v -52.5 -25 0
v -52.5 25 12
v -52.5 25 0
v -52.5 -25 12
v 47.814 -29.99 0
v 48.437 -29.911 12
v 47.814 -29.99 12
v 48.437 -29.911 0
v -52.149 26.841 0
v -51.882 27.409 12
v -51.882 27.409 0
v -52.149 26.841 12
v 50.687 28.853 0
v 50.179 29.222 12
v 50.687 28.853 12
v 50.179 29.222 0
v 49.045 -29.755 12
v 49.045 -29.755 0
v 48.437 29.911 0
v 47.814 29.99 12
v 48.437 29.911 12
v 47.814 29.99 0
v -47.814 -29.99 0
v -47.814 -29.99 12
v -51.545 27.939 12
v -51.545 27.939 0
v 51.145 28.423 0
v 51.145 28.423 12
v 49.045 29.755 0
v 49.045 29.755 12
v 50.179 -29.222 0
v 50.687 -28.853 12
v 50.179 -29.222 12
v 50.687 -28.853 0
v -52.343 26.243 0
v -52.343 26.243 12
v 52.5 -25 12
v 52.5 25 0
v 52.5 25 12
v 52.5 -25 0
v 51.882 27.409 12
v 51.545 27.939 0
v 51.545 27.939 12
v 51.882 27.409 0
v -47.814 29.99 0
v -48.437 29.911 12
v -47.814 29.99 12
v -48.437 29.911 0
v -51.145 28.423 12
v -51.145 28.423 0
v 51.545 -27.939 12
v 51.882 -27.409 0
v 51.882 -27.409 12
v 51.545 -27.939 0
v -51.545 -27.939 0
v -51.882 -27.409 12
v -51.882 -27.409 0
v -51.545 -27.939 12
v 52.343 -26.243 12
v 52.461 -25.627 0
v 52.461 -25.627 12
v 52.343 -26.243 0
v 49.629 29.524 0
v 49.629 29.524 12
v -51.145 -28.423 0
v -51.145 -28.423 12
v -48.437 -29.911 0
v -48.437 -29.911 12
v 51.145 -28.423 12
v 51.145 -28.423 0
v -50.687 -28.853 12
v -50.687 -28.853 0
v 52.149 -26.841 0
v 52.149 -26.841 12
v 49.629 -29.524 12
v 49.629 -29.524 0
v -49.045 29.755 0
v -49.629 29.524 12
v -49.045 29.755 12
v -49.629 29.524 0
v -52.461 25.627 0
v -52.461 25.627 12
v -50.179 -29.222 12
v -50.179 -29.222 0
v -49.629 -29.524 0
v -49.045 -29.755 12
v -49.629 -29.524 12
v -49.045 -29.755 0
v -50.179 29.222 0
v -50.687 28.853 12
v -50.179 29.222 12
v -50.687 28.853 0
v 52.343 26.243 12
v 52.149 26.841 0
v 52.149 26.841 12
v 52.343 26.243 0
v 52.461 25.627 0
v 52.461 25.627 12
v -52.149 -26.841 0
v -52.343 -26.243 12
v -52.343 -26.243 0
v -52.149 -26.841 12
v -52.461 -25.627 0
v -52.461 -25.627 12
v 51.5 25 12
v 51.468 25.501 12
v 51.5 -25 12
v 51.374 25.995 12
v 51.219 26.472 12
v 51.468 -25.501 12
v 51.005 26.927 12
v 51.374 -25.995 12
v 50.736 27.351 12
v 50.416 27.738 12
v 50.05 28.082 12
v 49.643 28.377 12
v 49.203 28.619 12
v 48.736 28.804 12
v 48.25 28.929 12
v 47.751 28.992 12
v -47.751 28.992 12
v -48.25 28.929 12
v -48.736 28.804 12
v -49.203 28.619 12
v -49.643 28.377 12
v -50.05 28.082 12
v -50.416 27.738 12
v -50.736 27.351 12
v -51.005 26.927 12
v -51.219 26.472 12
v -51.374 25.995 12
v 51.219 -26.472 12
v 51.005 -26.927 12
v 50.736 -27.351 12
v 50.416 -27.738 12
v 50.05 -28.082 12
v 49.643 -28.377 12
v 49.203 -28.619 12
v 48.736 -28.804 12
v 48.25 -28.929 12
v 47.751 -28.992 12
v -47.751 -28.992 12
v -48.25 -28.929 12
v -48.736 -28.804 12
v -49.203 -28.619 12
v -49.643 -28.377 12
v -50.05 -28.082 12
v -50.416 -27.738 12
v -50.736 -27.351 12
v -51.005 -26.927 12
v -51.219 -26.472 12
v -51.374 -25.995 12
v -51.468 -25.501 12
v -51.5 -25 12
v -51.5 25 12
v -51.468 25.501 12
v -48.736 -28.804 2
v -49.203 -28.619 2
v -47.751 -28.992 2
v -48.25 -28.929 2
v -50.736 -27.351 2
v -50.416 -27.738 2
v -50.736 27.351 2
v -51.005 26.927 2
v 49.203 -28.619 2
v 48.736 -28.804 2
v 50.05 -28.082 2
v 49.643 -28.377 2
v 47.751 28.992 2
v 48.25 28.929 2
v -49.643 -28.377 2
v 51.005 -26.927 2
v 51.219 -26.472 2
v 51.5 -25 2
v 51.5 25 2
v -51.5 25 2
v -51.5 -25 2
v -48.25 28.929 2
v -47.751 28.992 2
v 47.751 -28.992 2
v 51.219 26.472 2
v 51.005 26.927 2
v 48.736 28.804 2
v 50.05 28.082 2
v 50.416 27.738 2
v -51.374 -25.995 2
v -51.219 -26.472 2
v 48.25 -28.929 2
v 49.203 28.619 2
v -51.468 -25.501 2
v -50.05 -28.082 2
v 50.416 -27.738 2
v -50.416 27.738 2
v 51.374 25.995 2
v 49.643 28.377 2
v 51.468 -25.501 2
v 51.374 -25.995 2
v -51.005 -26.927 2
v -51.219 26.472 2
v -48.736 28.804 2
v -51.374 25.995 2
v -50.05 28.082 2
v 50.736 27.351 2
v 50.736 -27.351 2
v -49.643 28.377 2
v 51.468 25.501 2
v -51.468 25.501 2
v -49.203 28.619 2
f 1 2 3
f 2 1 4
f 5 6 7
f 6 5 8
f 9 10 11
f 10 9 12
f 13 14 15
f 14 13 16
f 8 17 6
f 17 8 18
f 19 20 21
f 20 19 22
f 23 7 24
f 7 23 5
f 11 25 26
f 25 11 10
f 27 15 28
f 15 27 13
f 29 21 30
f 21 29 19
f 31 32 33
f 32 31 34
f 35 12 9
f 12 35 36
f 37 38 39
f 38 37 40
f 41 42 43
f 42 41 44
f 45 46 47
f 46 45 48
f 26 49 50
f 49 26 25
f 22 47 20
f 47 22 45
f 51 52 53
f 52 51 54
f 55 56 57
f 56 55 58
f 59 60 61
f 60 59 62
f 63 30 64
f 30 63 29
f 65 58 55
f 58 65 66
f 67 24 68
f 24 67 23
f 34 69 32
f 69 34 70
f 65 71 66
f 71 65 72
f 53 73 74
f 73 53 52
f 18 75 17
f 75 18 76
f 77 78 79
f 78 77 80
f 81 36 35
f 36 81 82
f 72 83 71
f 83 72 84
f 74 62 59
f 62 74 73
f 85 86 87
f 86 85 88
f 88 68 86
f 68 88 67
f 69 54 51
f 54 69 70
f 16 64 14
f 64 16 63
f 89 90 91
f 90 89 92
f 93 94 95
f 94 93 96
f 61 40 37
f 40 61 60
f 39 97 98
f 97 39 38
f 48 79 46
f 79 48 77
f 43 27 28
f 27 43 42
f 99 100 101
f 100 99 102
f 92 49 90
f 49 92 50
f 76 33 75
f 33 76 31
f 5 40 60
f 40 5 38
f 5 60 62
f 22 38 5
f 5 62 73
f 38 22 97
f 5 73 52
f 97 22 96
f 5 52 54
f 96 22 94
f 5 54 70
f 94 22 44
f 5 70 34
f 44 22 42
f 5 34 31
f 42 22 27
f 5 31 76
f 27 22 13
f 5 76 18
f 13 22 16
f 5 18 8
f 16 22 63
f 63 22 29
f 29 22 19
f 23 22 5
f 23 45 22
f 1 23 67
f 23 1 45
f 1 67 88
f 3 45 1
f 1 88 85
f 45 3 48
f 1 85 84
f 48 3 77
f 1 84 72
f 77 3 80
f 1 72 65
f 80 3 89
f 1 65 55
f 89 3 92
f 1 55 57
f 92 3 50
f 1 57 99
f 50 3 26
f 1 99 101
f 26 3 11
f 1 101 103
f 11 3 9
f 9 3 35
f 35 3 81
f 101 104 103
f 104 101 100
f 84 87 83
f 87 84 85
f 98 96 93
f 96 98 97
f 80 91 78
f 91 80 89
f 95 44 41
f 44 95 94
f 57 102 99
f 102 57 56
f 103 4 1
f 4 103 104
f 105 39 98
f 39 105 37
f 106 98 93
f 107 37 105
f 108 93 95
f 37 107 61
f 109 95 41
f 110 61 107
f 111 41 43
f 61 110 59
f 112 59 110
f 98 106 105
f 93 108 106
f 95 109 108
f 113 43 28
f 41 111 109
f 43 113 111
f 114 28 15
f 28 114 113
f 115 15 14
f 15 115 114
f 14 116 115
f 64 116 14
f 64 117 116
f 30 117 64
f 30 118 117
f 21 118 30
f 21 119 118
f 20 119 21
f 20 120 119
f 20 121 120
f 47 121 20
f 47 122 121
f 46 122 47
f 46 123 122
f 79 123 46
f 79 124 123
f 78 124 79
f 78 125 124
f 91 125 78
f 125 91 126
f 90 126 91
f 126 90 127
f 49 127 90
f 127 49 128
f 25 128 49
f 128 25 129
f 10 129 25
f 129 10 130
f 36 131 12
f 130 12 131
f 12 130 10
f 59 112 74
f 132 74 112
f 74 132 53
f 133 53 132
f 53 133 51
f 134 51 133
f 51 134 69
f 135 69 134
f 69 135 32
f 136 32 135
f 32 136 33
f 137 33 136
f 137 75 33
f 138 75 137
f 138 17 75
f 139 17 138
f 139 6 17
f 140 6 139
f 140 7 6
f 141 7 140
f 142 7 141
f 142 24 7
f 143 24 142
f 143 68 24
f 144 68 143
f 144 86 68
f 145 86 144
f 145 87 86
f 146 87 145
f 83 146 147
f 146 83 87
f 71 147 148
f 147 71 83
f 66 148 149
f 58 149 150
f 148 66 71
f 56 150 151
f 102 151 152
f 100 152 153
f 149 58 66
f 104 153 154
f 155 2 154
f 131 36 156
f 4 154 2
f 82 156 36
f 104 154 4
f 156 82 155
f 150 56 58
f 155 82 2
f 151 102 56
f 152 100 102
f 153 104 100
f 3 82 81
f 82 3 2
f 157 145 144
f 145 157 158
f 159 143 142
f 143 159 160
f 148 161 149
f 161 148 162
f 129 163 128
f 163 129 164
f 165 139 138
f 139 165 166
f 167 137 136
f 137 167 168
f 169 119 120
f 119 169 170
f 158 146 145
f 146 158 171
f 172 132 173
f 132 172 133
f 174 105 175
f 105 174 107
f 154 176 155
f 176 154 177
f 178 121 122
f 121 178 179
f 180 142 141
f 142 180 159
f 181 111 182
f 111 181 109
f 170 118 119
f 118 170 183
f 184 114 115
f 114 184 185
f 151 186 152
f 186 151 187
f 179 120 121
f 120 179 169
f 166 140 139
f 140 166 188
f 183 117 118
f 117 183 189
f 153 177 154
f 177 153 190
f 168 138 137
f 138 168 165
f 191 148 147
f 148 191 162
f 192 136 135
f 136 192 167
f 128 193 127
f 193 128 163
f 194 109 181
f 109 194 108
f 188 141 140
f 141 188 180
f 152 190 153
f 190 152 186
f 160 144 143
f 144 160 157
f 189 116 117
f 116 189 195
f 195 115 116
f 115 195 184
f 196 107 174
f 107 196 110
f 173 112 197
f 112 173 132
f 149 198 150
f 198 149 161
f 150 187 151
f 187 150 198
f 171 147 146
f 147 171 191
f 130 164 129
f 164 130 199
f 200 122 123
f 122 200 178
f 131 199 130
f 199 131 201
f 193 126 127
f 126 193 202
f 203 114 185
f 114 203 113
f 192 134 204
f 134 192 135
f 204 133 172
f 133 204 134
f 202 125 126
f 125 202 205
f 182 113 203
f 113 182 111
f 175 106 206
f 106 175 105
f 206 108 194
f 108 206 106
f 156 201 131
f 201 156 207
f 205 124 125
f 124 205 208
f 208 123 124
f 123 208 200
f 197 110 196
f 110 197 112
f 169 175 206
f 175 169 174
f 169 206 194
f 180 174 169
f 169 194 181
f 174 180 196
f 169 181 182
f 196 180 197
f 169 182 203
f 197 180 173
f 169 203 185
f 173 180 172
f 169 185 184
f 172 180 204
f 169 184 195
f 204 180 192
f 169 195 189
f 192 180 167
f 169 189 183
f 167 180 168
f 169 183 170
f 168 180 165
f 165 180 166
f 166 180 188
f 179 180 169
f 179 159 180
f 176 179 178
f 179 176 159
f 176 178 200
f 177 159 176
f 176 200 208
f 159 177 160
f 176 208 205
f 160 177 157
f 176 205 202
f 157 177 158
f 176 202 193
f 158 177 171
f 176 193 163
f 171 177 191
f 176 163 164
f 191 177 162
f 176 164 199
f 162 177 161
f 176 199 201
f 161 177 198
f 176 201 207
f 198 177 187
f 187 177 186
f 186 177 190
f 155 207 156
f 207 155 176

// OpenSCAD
$fn = 50;


difference() {
	union() {
		hull() {
			translate(v = [-47.5000000000, 25.0000000000, 0]) {
				cylinder(h = 12, r = 5);
			}
			translate(v = [47.5000000000, 25.0000000000, 0]) {
				cylinder(h = 12, r = 5);
			}
			translate(v = [-47.5000000000, -25.0000000000, 0]) {
				cylinder(h = 12, r = 5);
			}
			translate(v = [47.5000000000, -25.0000000000, 0]) {
				cylinder(h = 12, r = 5);
			}
		}
	}
	union() {
		translate(v = [0, 0, 2]) {
			hull() {
				translate(v = [-47.5000000000, 25.0000000000, 0]) {
					cylinder(h = 10, r = 4);
				}
				translate(v = [47.5000000000, 25.0000000000, 0]) {
					cylinder(h = 10, r = 4);
				}
				translate(v = [-47.5000000000, -25.0000000000, 0]) {
					cylinder(h = 10, r = 4);
				}
				translate(v = [47.5000000000, -25.0000000000, 0]) {
					cylinder(h = 10, r = 4);
				}
			}
		}
	}
}
